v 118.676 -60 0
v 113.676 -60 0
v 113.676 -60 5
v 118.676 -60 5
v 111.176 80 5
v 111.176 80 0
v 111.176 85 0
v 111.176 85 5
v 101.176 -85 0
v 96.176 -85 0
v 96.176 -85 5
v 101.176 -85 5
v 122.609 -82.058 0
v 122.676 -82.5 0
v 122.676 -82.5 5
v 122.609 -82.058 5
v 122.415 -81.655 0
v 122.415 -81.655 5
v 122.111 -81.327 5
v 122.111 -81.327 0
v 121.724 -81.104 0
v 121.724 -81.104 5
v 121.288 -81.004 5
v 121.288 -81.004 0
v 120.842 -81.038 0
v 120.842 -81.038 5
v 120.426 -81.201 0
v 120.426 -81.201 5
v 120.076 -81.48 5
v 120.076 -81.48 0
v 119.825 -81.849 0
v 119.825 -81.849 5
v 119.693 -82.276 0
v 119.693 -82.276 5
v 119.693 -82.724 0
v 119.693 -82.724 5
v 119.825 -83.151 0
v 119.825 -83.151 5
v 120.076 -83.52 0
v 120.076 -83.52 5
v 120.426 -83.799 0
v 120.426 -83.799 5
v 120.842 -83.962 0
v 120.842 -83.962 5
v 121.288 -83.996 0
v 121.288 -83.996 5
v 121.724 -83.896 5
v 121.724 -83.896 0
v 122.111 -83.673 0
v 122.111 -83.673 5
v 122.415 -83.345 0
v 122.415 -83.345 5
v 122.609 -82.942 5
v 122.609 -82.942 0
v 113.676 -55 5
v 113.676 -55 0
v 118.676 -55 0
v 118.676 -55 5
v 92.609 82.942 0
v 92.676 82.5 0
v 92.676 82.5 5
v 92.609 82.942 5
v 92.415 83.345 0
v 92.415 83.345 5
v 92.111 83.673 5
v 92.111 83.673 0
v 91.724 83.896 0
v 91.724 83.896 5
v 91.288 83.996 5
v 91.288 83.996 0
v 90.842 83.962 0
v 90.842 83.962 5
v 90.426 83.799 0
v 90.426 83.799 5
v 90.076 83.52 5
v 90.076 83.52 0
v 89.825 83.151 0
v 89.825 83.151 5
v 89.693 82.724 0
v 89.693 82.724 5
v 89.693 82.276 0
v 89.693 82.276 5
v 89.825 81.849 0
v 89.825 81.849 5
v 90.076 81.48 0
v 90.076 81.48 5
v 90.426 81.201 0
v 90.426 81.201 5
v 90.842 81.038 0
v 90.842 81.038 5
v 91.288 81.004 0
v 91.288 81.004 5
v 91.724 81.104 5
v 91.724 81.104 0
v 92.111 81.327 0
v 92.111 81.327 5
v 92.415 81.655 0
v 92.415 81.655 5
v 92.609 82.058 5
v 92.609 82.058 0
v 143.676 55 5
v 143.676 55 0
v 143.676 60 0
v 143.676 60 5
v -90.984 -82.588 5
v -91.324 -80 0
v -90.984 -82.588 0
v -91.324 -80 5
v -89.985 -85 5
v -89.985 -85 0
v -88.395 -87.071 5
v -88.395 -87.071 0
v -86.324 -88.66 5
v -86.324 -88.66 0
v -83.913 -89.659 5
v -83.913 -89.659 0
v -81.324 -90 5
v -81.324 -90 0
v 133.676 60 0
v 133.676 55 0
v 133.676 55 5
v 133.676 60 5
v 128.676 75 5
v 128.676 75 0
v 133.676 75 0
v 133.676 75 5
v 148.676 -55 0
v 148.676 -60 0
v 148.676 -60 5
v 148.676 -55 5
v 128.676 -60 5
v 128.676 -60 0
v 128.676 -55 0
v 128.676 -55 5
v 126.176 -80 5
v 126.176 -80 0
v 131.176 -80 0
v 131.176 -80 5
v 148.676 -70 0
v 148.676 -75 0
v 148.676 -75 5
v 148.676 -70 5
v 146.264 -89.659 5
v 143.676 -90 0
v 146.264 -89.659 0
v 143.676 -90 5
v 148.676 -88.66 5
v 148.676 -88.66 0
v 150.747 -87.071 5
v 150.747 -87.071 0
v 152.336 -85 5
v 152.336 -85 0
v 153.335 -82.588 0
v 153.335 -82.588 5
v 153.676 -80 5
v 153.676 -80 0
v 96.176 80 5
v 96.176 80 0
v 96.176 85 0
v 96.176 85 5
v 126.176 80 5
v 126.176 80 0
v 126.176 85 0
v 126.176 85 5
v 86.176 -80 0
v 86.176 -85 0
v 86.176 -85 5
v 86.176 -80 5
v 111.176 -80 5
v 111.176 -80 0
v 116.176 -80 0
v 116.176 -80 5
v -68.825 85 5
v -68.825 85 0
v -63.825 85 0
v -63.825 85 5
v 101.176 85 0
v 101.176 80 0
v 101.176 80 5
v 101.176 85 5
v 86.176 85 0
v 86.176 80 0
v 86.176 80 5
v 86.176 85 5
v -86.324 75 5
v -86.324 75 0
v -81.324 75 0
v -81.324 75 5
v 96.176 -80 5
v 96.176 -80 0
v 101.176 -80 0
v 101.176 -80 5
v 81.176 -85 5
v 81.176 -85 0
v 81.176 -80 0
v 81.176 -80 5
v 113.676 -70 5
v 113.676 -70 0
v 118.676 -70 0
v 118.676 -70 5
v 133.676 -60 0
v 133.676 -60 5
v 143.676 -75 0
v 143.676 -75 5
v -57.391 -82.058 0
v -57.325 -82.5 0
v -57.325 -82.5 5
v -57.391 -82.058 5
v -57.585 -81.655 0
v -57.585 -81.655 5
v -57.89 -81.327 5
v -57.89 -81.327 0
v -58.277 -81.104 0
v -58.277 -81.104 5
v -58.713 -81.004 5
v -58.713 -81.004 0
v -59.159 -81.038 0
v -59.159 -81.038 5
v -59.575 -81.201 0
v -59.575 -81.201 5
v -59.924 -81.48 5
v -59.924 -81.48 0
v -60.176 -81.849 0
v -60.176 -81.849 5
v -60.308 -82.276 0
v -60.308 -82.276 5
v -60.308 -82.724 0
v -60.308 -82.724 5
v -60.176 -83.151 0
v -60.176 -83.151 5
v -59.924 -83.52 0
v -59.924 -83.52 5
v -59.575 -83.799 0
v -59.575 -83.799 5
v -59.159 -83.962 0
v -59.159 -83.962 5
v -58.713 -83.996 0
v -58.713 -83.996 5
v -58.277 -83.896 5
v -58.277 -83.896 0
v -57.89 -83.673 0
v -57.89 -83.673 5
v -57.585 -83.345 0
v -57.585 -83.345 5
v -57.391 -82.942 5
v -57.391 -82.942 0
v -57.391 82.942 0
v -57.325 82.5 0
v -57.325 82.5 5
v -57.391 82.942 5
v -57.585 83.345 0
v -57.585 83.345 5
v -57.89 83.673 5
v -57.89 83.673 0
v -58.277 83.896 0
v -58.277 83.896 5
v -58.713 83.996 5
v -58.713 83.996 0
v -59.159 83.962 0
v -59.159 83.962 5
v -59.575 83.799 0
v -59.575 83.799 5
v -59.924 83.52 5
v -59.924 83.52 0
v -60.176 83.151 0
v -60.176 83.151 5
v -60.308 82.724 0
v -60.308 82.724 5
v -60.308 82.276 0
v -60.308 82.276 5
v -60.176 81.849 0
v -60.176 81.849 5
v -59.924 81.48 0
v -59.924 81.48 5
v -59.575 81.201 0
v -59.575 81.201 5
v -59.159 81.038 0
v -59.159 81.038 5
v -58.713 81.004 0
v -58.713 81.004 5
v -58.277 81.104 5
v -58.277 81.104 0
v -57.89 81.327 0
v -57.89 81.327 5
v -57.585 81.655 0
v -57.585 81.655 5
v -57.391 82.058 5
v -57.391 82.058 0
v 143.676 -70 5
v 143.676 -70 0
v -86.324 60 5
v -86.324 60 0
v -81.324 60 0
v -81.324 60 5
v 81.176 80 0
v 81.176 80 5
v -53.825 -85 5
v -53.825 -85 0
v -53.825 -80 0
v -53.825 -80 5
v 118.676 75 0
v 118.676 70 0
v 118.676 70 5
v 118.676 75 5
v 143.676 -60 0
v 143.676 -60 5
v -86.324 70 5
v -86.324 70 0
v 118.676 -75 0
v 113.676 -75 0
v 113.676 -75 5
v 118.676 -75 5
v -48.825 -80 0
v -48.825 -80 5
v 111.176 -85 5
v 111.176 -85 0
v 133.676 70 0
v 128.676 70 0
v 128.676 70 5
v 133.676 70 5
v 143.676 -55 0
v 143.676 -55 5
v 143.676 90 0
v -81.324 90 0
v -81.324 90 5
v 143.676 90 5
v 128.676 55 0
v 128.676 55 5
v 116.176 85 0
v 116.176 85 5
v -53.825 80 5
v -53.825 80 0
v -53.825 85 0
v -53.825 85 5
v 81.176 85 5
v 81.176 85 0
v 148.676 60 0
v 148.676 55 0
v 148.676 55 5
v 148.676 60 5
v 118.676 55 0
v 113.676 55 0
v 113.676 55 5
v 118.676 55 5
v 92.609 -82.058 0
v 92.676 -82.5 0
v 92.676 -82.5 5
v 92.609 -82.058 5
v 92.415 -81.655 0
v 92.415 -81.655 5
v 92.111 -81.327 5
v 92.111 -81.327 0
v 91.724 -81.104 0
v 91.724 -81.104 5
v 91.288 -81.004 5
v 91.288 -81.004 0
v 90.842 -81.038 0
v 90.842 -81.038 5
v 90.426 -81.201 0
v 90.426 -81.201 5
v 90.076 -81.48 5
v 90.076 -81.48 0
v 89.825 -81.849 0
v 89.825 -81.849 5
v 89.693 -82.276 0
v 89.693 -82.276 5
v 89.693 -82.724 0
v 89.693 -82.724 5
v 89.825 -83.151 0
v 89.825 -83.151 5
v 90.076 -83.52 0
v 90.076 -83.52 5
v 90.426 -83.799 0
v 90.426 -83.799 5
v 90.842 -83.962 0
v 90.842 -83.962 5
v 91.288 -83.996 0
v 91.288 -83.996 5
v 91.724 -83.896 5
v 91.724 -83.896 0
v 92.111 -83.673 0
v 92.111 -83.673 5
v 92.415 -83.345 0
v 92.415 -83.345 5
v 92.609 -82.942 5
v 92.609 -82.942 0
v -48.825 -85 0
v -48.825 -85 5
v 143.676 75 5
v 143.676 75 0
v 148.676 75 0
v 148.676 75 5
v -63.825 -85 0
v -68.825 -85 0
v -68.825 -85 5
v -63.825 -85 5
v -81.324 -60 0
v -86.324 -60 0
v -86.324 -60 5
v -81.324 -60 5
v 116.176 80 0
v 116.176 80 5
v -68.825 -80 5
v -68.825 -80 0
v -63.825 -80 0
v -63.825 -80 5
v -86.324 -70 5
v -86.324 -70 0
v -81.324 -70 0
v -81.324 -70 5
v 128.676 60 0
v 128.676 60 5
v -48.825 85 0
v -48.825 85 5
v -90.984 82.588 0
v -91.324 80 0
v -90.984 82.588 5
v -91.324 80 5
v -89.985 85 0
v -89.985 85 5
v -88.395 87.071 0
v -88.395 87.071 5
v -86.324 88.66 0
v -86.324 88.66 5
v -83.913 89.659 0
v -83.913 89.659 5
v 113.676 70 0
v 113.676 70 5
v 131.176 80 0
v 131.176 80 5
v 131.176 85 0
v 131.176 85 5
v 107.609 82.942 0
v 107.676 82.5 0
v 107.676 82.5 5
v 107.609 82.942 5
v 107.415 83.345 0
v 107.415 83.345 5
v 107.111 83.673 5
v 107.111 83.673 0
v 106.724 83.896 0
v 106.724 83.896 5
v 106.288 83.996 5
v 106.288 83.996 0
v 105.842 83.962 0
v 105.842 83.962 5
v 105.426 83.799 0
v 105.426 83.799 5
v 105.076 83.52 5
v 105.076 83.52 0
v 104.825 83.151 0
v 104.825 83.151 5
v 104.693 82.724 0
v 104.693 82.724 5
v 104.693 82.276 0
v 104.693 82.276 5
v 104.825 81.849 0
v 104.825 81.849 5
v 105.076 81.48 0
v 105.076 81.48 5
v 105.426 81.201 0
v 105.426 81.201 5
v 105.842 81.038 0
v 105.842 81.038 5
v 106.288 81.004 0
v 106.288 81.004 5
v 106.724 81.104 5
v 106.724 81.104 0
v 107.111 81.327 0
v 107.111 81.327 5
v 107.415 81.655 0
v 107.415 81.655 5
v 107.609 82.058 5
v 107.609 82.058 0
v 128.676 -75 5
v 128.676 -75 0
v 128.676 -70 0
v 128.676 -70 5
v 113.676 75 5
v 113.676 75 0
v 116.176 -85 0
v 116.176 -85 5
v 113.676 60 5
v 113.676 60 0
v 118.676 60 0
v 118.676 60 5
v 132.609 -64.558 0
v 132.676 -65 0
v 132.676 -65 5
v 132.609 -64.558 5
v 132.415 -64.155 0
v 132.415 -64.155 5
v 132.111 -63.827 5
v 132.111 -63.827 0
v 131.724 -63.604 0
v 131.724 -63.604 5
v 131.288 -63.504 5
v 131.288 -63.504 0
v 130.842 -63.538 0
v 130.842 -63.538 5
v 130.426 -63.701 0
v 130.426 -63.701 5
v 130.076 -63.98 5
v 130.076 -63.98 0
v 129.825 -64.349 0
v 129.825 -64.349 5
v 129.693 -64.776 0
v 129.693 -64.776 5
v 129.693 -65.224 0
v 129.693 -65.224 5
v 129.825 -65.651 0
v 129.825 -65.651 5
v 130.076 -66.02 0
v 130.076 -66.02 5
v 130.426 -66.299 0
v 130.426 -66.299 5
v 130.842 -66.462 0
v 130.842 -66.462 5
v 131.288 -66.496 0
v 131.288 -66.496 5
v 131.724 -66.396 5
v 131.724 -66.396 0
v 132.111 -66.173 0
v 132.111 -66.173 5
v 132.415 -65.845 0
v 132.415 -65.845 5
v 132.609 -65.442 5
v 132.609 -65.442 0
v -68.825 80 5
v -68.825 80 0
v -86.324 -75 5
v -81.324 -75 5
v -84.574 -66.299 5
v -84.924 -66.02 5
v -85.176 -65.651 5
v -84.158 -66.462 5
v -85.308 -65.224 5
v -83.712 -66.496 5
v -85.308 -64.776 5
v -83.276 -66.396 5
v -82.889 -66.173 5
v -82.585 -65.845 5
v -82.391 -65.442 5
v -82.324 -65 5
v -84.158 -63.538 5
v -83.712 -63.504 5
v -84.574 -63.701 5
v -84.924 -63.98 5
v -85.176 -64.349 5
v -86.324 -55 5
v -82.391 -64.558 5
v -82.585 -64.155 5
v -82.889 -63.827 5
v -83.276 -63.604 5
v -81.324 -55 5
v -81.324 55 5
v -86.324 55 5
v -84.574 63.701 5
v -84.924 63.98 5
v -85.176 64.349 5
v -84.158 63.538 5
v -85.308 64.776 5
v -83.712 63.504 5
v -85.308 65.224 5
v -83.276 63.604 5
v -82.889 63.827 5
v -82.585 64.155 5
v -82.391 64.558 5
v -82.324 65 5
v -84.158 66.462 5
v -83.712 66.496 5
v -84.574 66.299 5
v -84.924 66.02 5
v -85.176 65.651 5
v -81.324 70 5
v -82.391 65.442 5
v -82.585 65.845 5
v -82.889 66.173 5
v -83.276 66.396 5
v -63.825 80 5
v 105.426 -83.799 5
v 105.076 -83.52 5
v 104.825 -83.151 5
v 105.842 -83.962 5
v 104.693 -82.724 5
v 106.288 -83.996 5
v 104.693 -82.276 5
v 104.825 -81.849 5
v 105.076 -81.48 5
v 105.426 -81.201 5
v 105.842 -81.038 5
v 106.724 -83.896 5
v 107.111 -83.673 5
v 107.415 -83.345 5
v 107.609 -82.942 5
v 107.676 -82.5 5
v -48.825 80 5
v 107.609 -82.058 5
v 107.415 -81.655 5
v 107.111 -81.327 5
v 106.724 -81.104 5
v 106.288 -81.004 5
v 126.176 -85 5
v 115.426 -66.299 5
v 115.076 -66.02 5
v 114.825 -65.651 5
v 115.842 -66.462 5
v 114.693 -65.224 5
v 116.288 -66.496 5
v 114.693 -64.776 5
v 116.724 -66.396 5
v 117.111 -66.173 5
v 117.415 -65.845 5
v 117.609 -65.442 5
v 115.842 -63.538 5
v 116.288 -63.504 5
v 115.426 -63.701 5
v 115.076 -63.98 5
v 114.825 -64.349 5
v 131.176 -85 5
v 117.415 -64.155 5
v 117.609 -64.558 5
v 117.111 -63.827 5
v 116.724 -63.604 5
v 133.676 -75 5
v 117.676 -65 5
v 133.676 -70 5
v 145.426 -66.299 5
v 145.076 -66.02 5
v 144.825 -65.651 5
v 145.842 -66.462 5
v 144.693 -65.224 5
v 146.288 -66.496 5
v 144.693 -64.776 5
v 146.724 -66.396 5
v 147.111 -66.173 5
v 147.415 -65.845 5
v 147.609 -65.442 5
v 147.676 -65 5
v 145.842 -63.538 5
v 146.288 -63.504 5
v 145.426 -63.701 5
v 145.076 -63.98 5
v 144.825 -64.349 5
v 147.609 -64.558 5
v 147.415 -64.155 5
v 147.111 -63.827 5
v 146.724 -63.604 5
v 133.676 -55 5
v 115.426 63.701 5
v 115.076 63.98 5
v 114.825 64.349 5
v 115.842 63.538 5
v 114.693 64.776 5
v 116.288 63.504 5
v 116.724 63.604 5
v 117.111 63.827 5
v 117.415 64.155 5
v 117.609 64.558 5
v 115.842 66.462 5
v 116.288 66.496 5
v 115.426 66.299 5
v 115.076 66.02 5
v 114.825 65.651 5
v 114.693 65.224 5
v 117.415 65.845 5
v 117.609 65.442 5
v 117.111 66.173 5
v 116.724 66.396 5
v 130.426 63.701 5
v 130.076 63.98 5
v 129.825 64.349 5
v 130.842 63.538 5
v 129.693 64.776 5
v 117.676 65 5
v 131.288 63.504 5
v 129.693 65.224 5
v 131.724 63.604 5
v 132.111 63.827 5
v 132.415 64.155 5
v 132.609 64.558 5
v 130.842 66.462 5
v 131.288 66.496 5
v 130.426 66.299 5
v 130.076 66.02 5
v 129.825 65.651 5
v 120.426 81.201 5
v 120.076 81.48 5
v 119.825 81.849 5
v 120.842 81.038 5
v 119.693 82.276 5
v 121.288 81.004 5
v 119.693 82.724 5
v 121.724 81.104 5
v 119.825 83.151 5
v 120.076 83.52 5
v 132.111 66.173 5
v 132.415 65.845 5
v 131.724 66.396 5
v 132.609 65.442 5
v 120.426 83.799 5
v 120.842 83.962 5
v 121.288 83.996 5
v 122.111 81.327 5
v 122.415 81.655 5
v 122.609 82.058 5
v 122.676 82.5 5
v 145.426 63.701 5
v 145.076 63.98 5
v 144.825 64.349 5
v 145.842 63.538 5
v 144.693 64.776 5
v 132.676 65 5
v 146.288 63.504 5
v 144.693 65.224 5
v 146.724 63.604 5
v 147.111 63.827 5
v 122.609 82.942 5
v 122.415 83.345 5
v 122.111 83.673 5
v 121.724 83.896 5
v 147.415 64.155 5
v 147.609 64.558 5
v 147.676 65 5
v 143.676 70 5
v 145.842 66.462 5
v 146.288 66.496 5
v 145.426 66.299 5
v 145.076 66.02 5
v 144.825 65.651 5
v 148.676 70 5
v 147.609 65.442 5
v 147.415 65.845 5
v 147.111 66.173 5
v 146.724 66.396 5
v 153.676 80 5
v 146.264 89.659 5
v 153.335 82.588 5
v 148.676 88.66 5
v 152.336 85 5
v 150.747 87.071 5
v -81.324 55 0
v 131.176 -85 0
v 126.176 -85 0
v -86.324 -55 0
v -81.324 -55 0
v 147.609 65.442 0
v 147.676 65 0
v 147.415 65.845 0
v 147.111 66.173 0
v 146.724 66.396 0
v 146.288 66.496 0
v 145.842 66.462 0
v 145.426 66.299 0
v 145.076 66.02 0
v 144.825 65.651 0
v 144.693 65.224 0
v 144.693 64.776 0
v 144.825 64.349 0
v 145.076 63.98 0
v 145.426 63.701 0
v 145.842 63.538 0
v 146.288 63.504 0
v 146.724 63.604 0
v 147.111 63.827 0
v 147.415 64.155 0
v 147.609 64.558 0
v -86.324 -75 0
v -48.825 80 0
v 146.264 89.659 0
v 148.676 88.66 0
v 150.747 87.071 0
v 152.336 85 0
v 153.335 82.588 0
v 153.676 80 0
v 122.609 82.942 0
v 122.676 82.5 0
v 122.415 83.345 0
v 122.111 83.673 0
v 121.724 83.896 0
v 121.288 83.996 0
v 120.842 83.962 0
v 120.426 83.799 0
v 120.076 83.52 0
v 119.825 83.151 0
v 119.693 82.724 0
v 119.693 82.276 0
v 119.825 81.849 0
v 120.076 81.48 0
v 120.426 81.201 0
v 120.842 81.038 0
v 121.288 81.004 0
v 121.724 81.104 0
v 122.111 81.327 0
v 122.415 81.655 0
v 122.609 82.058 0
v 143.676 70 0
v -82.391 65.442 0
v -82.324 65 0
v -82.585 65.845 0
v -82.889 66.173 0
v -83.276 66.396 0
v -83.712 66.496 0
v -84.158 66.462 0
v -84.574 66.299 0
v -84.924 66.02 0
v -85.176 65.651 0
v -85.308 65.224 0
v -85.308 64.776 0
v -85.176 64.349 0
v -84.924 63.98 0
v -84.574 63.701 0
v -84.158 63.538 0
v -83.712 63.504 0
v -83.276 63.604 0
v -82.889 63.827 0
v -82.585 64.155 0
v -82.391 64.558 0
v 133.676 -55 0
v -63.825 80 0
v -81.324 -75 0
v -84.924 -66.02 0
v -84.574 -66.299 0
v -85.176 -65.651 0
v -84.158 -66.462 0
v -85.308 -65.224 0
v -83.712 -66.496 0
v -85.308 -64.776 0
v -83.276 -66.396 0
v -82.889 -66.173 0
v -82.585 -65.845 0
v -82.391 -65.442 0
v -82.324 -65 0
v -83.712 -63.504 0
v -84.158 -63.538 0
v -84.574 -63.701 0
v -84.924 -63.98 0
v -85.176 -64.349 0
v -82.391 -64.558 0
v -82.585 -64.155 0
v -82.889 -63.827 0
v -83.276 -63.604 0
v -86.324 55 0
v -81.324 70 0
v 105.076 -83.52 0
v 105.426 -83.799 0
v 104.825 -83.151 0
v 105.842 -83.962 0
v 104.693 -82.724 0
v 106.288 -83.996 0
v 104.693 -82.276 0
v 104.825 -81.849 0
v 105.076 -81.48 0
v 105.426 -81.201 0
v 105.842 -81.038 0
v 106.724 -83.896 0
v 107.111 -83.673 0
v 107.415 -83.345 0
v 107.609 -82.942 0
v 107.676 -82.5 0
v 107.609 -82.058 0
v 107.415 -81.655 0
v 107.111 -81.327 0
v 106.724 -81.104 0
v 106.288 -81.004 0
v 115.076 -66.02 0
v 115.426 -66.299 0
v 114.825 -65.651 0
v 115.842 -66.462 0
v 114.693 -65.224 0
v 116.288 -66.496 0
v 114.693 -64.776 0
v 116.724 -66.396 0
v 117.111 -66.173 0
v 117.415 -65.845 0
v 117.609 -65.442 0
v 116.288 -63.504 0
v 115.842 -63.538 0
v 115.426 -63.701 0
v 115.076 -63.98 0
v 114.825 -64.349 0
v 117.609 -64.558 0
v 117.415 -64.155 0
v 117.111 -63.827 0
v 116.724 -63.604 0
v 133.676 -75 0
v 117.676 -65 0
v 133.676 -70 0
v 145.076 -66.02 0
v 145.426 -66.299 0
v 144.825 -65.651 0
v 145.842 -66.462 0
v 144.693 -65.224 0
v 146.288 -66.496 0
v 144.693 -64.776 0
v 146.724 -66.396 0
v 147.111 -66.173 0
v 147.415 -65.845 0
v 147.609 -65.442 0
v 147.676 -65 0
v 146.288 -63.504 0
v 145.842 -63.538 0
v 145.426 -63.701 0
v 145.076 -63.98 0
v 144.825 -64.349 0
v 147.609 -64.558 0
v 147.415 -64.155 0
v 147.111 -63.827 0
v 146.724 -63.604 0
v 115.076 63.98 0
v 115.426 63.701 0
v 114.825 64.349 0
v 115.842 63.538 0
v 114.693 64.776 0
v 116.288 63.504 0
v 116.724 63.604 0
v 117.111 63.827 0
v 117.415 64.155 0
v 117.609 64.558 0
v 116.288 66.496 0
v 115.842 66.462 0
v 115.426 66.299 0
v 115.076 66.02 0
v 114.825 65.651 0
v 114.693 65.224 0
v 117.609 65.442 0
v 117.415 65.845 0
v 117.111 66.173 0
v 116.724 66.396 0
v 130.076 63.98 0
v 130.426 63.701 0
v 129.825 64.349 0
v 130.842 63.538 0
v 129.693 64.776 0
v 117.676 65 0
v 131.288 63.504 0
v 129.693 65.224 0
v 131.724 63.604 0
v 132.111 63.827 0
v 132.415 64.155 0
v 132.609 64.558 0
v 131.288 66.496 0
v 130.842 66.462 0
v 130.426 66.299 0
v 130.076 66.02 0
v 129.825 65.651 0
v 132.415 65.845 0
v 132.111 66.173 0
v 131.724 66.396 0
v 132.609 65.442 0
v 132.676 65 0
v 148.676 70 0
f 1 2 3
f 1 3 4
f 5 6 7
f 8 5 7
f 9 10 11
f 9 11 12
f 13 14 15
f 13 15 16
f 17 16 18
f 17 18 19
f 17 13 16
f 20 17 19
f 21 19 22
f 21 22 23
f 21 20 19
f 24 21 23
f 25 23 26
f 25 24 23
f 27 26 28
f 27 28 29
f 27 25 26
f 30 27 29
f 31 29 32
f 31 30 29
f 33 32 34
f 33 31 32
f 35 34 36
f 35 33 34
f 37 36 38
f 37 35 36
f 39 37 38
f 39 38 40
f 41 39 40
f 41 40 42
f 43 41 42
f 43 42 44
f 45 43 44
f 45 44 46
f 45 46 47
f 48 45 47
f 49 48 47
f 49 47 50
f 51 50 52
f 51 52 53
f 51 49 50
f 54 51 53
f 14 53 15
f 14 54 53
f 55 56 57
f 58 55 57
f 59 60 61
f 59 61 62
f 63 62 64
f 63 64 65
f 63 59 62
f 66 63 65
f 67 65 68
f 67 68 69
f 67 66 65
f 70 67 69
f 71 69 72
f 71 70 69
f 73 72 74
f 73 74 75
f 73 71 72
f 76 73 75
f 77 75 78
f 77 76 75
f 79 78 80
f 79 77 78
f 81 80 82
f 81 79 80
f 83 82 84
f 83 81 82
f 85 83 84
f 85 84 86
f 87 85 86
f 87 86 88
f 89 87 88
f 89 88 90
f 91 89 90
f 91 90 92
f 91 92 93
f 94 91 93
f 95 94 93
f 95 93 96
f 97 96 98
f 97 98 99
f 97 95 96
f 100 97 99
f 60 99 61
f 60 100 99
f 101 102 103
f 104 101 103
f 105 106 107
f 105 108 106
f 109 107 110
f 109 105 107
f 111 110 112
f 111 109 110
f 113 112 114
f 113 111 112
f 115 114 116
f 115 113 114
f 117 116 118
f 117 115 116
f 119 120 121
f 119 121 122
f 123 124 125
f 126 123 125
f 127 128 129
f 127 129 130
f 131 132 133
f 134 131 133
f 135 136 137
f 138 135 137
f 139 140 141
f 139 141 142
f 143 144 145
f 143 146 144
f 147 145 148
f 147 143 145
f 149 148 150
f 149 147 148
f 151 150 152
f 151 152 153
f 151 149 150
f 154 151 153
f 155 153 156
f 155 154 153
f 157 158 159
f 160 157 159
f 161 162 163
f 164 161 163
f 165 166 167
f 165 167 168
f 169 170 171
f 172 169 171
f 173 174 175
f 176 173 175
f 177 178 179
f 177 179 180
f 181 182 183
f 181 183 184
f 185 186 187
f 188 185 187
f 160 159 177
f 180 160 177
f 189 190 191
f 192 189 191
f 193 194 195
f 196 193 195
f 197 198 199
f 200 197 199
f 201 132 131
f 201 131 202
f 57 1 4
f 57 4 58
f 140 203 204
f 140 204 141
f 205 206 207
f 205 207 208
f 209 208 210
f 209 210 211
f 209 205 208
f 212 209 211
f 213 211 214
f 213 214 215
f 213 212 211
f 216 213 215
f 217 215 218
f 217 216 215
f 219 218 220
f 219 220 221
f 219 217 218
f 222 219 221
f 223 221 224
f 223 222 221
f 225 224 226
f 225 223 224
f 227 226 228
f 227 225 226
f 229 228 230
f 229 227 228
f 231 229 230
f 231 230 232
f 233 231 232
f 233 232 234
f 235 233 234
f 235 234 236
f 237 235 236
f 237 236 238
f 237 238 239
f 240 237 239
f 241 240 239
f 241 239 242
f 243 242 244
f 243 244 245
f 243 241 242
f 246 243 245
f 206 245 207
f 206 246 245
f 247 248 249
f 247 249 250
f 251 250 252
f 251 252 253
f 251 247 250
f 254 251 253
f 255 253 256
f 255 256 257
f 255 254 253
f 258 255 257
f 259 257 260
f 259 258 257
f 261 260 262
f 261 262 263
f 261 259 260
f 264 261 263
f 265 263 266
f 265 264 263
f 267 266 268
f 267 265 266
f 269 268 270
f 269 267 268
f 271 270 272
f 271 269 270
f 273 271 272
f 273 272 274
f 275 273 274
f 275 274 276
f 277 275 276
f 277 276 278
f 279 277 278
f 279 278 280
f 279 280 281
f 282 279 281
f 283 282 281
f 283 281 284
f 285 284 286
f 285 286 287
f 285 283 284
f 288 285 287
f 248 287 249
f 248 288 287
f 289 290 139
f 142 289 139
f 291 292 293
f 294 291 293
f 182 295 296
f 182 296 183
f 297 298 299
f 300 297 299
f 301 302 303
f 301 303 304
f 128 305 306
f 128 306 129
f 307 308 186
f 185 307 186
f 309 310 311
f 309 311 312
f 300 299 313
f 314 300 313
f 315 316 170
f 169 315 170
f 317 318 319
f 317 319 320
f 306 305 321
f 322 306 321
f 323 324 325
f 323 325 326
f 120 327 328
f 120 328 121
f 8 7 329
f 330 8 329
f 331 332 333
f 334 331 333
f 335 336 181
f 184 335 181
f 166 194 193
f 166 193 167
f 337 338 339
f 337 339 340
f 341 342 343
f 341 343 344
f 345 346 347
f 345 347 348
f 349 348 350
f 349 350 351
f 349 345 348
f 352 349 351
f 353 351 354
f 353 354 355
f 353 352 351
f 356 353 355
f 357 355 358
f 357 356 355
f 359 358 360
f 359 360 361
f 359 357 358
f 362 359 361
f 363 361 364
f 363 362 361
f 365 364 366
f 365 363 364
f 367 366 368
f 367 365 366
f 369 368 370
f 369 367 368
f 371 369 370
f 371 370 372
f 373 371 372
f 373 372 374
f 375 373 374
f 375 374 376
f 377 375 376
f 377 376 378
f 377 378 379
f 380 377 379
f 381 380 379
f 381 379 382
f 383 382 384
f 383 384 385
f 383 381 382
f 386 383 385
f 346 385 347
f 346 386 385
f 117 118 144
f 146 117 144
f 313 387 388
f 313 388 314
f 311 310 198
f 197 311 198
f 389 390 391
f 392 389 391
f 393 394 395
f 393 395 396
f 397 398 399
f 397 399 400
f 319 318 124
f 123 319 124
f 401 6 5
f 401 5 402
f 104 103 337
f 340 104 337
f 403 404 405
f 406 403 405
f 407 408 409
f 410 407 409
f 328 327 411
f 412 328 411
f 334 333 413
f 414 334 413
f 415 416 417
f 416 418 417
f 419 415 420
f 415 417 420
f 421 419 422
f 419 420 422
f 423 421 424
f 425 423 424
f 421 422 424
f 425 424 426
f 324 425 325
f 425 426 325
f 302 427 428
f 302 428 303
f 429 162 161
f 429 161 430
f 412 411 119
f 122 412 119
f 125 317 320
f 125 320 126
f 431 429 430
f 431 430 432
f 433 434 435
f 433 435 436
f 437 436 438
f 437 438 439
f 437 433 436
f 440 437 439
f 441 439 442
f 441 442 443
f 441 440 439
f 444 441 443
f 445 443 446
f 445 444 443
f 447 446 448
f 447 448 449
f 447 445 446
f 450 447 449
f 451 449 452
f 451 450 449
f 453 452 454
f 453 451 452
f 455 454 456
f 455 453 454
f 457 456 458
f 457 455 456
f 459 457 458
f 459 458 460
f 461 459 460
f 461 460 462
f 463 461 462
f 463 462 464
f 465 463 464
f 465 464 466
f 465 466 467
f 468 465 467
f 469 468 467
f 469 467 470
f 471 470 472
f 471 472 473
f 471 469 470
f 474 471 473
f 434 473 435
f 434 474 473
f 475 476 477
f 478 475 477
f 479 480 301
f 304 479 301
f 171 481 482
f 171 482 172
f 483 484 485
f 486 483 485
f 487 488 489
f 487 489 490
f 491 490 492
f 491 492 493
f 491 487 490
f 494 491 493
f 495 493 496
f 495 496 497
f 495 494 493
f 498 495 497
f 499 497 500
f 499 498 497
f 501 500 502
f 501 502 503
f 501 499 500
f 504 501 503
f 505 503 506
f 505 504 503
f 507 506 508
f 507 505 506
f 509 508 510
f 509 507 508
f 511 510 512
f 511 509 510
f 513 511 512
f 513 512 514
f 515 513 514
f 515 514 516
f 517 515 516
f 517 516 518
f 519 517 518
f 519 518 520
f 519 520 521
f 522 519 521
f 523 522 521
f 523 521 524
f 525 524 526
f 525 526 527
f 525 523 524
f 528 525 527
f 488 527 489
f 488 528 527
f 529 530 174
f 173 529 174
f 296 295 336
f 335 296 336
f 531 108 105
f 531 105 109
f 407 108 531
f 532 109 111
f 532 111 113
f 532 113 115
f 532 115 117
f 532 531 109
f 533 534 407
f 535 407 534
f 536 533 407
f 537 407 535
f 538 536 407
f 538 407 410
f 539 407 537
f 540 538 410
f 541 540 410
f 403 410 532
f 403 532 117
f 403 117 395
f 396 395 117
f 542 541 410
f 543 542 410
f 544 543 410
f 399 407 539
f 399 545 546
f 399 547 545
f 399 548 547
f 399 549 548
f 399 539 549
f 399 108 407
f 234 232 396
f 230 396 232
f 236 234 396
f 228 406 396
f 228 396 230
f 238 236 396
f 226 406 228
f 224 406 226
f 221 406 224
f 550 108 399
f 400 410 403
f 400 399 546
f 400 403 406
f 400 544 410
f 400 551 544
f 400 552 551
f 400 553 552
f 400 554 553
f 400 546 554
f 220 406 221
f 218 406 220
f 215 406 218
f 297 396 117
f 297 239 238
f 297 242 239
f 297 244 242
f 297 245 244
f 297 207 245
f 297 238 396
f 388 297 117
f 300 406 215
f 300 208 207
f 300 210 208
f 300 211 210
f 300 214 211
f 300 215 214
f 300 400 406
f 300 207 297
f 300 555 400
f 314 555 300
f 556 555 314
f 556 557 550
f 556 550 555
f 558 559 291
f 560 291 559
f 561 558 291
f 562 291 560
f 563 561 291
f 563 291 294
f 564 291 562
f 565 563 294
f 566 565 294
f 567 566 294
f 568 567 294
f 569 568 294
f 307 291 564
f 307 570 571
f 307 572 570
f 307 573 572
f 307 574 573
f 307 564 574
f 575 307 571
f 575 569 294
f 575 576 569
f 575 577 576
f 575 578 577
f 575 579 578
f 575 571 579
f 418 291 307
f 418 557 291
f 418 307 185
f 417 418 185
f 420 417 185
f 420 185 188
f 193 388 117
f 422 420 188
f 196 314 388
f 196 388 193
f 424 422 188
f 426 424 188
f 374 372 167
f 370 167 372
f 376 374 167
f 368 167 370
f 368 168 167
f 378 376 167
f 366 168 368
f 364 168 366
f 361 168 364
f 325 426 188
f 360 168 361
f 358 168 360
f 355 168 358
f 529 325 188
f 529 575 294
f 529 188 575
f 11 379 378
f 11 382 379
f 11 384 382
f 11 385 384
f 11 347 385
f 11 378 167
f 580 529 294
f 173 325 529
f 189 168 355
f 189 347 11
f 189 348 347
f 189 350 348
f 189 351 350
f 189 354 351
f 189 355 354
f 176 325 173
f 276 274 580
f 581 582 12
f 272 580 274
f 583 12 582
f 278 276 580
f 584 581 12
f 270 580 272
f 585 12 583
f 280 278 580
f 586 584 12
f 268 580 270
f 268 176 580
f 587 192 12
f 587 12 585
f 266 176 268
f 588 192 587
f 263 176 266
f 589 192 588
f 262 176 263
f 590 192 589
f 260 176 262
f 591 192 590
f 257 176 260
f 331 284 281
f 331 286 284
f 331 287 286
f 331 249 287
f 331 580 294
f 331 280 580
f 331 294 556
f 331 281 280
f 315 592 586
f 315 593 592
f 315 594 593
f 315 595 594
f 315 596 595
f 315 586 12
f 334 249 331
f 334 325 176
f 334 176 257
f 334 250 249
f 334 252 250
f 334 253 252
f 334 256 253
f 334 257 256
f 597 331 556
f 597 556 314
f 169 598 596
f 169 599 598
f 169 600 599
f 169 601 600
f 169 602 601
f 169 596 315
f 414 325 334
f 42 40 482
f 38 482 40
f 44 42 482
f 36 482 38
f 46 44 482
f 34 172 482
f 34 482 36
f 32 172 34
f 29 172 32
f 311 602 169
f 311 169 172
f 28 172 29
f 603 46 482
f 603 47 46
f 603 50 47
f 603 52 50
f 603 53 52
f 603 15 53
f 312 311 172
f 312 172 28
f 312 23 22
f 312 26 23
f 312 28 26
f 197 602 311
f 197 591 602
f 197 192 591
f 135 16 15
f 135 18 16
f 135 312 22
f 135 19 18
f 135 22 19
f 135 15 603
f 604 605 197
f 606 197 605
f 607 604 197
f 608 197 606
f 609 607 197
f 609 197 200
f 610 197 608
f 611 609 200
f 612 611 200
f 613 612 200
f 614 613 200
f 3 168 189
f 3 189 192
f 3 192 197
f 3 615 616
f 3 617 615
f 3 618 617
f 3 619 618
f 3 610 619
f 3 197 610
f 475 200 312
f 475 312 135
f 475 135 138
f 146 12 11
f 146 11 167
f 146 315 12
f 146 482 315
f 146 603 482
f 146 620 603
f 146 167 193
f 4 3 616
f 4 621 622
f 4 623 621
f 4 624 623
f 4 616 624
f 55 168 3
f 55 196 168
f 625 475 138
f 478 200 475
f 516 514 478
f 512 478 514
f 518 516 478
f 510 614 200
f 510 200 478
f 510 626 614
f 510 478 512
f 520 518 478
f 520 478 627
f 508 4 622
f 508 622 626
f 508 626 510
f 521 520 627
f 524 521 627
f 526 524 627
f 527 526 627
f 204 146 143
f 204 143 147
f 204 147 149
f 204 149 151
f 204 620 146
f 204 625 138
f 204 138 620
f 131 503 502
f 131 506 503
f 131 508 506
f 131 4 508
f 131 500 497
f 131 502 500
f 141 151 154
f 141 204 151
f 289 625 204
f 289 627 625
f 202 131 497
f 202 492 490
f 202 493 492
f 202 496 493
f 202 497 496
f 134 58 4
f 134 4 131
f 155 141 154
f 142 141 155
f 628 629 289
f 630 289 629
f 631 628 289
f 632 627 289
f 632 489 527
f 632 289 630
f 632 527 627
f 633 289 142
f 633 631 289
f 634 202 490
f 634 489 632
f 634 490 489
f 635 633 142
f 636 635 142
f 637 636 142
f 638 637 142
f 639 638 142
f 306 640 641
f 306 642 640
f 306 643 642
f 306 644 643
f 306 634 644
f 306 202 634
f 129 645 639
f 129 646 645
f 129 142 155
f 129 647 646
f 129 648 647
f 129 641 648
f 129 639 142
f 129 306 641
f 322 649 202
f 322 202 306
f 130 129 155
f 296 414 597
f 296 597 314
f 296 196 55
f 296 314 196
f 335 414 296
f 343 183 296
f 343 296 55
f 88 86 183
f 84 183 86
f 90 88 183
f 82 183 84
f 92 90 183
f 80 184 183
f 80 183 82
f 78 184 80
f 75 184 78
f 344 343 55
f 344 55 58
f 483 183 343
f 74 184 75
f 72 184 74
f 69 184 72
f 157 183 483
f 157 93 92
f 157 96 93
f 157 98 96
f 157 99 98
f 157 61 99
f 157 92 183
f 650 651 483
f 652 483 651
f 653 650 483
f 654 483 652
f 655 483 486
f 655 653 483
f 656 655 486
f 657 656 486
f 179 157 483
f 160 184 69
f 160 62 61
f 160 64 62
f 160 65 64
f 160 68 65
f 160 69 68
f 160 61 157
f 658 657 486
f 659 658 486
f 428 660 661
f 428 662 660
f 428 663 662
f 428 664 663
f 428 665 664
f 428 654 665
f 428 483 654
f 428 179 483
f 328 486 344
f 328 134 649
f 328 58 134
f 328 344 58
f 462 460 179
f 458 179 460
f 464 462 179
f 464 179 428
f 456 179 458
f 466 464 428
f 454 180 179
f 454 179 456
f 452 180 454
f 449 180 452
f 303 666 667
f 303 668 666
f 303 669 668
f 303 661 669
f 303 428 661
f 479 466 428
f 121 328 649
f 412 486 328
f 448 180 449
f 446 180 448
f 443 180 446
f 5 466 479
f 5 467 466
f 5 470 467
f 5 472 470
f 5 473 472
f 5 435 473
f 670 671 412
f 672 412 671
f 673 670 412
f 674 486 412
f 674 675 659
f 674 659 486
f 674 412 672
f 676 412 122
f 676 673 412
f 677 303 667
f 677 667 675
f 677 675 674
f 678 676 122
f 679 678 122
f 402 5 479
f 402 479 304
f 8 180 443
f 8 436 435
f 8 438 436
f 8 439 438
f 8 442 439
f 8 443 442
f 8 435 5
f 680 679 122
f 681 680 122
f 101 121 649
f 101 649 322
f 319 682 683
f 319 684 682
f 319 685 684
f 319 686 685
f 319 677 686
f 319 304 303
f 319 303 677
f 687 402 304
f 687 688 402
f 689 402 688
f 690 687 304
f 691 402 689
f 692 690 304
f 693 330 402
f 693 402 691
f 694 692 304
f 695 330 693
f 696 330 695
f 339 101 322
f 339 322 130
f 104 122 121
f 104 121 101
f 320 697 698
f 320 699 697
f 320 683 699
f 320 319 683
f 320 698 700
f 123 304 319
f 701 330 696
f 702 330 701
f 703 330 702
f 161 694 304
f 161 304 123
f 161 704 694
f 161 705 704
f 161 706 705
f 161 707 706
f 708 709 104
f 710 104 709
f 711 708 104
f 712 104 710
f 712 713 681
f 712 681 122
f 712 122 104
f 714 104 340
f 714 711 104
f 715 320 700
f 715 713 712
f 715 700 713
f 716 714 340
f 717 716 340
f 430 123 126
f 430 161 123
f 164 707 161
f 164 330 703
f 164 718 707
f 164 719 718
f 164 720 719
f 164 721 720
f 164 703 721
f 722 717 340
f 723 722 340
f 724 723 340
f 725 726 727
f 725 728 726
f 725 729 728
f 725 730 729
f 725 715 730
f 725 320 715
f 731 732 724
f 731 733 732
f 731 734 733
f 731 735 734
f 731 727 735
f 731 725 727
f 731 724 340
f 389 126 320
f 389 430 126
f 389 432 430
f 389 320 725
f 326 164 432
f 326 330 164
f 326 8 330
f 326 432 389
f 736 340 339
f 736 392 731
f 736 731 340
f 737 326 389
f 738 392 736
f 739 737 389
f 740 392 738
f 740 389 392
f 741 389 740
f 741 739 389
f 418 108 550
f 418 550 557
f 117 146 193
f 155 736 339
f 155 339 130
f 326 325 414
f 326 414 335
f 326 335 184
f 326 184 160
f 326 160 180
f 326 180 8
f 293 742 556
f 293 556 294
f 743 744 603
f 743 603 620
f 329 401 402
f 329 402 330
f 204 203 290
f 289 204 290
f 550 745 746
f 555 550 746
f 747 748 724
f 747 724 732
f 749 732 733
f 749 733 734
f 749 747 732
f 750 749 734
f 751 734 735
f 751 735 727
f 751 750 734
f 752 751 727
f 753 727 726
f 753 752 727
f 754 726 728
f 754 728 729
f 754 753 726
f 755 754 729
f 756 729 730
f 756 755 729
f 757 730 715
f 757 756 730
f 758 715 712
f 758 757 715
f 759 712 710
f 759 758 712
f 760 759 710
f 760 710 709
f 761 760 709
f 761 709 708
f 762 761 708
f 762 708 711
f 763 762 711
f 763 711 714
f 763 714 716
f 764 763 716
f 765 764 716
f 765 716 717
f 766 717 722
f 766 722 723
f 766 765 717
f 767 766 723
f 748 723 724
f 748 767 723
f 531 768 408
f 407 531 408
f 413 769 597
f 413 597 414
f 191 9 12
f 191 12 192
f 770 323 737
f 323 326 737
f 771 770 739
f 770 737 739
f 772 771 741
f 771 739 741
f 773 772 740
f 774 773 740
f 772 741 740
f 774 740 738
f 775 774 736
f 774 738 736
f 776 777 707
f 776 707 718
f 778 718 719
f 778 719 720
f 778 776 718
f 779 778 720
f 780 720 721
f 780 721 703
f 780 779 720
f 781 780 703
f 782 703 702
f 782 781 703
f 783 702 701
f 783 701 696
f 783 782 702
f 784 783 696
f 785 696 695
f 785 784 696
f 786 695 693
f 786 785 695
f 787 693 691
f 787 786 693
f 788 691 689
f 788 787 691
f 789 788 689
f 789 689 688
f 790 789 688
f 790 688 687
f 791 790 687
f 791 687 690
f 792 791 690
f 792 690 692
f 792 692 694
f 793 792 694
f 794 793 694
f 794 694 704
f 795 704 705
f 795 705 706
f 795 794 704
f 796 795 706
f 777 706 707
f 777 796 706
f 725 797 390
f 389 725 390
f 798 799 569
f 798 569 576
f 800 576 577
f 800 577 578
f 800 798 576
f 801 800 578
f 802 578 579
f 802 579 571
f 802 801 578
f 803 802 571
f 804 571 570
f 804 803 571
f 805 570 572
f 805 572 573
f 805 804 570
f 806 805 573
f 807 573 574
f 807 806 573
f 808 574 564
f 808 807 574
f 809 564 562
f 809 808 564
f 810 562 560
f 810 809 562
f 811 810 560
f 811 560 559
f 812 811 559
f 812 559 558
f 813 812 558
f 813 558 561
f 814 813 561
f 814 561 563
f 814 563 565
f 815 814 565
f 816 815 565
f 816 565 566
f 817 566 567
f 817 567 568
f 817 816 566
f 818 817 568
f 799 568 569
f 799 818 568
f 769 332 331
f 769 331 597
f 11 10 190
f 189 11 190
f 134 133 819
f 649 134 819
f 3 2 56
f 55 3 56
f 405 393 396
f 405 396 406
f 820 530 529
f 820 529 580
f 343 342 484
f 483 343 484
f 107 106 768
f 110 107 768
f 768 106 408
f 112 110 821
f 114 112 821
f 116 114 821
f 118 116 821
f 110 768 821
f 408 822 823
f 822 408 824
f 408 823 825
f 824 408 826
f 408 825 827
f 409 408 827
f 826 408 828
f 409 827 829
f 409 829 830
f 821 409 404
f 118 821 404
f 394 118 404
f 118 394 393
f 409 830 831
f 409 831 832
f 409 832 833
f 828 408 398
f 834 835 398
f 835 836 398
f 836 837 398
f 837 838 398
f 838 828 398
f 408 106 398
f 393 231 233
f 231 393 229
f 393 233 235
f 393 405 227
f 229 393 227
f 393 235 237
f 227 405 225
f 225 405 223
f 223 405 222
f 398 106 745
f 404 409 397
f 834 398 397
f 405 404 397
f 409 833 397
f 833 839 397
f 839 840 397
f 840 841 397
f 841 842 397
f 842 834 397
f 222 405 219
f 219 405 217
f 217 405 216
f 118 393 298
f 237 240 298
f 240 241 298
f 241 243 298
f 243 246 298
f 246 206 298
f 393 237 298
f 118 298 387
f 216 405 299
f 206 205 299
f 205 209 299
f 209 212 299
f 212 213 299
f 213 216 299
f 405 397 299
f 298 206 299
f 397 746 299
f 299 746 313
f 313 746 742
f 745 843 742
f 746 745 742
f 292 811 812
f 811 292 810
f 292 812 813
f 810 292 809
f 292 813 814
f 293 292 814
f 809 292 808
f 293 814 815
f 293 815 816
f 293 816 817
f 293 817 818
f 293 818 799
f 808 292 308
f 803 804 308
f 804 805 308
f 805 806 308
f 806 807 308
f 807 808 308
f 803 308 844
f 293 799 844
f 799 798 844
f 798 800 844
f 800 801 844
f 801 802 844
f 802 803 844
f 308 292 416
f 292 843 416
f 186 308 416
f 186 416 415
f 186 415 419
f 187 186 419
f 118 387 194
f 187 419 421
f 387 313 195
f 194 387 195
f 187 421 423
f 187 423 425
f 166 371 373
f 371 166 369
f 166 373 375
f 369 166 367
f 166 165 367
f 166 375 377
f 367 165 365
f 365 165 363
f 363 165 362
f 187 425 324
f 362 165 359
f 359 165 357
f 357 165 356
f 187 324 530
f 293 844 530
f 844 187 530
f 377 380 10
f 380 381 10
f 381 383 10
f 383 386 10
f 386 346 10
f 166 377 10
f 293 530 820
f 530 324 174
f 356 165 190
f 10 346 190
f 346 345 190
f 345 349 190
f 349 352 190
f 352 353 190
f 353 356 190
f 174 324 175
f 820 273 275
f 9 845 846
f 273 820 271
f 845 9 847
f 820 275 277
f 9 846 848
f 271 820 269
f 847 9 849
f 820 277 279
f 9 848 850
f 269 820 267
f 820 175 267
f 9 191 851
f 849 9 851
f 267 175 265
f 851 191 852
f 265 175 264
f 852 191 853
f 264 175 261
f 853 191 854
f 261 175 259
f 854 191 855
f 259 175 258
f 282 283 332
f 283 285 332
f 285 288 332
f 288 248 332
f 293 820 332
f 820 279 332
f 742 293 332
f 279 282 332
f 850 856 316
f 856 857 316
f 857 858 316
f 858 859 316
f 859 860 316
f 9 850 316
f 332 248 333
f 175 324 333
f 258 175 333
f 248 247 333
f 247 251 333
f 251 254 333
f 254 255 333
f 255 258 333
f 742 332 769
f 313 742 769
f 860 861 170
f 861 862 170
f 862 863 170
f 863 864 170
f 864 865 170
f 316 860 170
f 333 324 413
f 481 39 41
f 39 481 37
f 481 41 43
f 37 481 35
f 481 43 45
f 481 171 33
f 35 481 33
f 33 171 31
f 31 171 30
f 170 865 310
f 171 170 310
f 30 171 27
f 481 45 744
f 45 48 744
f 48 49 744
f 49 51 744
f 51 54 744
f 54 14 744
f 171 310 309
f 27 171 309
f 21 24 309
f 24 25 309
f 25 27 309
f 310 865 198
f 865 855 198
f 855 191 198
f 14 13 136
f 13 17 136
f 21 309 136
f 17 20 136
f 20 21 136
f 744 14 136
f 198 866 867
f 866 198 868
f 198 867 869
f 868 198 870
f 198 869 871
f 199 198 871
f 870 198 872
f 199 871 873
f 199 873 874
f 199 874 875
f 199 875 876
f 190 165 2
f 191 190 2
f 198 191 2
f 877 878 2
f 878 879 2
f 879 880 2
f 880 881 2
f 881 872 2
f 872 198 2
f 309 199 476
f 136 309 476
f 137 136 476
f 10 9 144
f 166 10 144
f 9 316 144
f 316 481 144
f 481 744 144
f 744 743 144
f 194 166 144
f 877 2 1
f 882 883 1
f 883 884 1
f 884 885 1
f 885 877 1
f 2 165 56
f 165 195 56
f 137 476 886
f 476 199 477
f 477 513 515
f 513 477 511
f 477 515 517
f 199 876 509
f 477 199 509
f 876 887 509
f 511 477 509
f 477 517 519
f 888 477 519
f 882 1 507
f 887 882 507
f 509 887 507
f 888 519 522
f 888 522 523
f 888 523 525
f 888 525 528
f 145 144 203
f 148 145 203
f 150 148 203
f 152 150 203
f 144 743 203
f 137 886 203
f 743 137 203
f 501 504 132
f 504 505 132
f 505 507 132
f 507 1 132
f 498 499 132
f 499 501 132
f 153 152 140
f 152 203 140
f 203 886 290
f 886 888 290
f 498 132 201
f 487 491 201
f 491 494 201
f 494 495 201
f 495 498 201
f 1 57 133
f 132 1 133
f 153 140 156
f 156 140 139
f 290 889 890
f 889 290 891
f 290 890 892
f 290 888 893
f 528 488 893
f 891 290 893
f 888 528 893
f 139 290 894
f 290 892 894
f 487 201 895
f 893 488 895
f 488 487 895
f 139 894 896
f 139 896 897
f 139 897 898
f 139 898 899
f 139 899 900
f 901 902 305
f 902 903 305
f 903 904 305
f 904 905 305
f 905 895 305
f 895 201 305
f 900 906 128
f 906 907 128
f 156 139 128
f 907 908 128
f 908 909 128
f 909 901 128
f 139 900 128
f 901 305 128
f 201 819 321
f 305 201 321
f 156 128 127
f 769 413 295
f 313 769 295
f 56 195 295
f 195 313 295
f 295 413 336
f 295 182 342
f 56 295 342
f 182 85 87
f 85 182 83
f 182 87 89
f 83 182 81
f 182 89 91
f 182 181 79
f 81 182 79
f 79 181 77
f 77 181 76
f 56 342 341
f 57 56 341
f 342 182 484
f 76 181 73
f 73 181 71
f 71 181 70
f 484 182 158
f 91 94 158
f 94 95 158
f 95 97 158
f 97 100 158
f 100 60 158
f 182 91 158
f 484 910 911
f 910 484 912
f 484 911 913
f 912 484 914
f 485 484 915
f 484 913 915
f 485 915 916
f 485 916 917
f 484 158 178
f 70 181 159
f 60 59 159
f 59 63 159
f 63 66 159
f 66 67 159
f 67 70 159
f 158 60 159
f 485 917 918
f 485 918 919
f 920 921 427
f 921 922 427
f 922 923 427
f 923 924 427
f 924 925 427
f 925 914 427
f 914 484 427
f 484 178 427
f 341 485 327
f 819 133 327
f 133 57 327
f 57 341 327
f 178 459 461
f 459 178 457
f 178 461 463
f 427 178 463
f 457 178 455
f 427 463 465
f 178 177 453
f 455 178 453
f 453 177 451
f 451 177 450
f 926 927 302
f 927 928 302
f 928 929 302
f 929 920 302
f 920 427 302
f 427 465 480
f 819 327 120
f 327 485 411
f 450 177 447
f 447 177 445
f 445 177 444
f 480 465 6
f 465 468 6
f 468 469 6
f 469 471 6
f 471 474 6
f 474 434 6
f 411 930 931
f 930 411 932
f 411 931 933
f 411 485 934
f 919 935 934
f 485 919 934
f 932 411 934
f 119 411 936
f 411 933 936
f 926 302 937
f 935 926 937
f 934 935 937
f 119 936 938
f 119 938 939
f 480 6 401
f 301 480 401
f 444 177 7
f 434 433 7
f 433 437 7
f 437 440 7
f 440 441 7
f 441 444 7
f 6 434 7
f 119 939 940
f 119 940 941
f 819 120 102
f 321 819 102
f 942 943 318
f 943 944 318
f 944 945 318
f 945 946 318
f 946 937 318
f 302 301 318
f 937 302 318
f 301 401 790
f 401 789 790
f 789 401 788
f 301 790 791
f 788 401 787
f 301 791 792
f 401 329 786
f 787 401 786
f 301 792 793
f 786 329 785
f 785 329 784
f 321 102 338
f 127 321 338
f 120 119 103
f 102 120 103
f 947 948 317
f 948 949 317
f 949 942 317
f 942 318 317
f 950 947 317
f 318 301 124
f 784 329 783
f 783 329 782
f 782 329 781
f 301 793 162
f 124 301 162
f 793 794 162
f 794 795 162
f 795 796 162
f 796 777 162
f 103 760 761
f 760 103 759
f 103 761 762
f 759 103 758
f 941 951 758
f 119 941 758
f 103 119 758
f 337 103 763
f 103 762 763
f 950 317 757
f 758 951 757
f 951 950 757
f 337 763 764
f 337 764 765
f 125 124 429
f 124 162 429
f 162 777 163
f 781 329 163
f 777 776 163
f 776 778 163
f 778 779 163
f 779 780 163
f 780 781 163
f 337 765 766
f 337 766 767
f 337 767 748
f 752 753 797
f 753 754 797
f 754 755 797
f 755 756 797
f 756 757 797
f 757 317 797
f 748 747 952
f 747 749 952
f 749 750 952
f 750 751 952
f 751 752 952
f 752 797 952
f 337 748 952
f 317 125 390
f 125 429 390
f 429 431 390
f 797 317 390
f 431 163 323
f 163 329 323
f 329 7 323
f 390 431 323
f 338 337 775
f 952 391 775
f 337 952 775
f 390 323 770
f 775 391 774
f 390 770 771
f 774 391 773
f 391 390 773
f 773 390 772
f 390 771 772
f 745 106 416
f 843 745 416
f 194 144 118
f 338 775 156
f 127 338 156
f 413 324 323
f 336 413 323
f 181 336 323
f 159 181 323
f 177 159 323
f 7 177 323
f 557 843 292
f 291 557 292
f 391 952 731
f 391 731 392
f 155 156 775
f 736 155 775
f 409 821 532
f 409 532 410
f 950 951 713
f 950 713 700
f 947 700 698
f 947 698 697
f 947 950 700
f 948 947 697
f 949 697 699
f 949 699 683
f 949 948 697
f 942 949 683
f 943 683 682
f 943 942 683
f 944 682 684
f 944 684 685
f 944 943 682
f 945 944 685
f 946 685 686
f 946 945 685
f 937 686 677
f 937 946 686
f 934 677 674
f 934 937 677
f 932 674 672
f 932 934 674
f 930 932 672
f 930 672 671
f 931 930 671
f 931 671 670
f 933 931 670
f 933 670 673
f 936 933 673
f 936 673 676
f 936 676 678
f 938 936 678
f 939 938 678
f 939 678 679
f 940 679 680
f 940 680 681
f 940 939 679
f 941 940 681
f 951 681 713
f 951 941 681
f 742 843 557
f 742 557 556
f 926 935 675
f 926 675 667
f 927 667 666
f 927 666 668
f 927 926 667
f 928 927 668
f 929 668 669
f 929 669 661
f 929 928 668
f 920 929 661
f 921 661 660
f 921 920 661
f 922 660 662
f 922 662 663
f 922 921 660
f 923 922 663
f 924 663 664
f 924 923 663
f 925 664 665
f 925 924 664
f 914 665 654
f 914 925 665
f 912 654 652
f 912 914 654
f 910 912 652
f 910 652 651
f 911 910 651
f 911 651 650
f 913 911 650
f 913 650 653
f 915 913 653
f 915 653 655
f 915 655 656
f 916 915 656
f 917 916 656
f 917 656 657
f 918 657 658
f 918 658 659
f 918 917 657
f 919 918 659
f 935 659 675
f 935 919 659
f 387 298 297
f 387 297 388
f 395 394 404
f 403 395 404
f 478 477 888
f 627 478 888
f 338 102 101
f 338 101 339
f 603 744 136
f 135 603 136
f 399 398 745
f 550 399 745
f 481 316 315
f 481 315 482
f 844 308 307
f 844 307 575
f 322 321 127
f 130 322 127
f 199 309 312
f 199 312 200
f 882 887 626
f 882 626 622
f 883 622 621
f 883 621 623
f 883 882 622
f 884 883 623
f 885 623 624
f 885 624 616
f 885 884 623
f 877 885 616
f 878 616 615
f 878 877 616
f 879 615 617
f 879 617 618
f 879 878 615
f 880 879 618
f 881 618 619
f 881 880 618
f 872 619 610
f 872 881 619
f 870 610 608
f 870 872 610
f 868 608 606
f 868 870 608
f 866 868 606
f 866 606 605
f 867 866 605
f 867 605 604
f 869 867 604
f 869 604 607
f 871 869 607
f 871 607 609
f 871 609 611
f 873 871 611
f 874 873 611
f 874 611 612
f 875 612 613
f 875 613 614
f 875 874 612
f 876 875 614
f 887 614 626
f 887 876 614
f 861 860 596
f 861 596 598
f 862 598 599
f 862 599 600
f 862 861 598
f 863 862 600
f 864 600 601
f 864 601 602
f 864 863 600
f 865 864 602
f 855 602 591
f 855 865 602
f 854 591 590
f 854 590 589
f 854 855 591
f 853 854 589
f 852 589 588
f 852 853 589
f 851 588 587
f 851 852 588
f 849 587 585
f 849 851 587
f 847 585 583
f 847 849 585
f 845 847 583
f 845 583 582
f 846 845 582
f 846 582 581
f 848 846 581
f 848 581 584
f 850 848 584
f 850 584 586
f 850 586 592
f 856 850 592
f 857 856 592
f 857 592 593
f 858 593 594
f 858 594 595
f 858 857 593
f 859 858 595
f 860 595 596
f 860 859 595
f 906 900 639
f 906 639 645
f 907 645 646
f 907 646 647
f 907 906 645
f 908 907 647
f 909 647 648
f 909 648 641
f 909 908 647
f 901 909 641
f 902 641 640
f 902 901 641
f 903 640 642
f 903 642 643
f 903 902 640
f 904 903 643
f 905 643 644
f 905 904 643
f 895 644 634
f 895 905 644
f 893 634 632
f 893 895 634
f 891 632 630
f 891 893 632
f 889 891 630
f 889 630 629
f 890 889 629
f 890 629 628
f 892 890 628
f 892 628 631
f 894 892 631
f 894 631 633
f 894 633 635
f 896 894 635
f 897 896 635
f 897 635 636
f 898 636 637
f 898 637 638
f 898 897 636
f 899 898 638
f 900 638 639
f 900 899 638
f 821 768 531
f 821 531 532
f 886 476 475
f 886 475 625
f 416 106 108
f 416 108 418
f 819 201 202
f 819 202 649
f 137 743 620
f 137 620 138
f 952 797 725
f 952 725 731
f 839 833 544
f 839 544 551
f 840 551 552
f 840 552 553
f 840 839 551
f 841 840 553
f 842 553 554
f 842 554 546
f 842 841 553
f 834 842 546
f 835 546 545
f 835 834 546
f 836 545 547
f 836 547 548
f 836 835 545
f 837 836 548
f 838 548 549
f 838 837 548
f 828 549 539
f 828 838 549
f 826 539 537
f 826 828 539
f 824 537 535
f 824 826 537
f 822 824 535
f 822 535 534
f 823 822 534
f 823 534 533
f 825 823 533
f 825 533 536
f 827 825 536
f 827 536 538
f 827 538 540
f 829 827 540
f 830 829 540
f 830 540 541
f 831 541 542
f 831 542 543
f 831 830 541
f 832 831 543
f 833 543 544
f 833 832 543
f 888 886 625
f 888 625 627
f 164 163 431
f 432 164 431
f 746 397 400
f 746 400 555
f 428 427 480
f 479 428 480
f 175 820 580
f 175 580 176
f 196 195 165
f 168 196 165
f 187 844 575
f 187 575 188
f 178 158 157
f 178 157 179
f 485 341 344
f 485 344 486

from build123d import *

# Parameters (mm, degrees)
BOSS_EXTRUDE1_OUTLINE_W   = 245.000446045
BOSS_EXTRUDE1_OUTLINE_H   = 180
BOSS_EXTRUDE1_OUTLINE_W_2 = 5
BOSS_EXTRUDE1_OUTLINE_H_2 = 5
BOSS_EXTRUDE1_OUTLINE_R   = 1.5
BOSS_EXTRUDE1_DEPTH       = 5
FILLET1_R                 = 10


# Read off the part's stored shape, not the designer's step: Boss-Extrude1
with BuildPart() as part:
    # Boss-Extrude1 outline → Boss-Extrude1 (new body)
    with BuildSketch(Plane.XY):
        with Locations((31.175821468, 0)):
            Rectangle(BOSS_EXTRUDE1_OUTLINE_W, BOSS_EXTRUDE1_OUTLINE_H)
        with Locations((-66.324847601, -82.5)):
            Rectangle(BOSS_EXTRUDE1_OUTLINE_W_2, BOSS_EXTRUDE1_OUTLINE_H_2, mode=Mode.SUBTRACT)
        with Locations((-83.824401555, -72.5)):
            Rectangle(BOSS_EXTRUDE1_OUTLINE_W_2, BOSS_EXTRUDE1_OUTLINE_H_2, mode=Mode.SUBTRACT)
        with Locations((-58.824847601, -82.5)):
            Circle(BOSS_EXTRUDE1_OUTLINE_R, mode=Mode.SUBTRACT)
        with Locations((-51.324847601, -82.5)):
            Rectangle(BOSS_EXTRUDE1_OUTLINE_W_2, BOSS_EXTRUDE1_OUTLINE_H_2, mode=Mode.SUBTRACT)
        with Locations((-83.824401555, -65)):
            Circle(BOSS_EXTRUDE1_OUTLINE_R, mode=Mode.SUBTRACT)
        with Locations((-83.824401555, -57.5)):
            Rectangle(BOSS_EXTRUDE1_OUTLINE_W_2, BOSS_EXTRUDE1_OUTLINE_H_2, mode=Mode.SUBTRACT)
        with Locations((83.67604449, -82.5)):
            Rectangle(BOSS_EXTRUDE1_OUTLINE_W_2, BOSS_EXTRUDE1_OUTLINE_H_2, mode=Mode.SUBTRACT)
        with Locations((91.17604449, -82.5)):
            Circle(BOSS_EXTRUDE1_OUTLINE_R, mode=Mode.SUBTRACT)
        with Locations((98.67604449, -82.5)):
            Rectangle(BOSS_EXTRUDE1_OUTLINE_W_2, BOSS_EXTRUDE1_OUTLINE_H_2, mode=Mode.SUBTRACT)
        with Locations((106.17604449, -82.5)):
            Circle(BOSS_EXTRUDE1_OUTLINE_R, mode=Mode.SUBTRACT)
        with Locations((113.67604449, -82.5)):
            Rectangle(BOSS_EXTRUDE1_OUTLINE_W_2, BOSS_EXTRUDE1_OUTLINE_H_2, mode=Mode.SUBTRACT)
        with Locations((121.17604449, -82.5)):
            Circle(BOSS_EXTRUDE1_OUTLINE_R, mode=Mode.SUBTRACT)
        with Locations((116.17604449, -72.5)):
            Rectangle(BOSS_EXTRUDE1_OUTLINE_W_2, BOSS_EXTRUDE1_OUTLINE_H_2, mode=Mode.SUBTRACT)
        with Locations((128.67604449, -82.5)):
            Rectangle(BOSS_EXTRUDE1_OUTLINE_W_2, BOSS_EXTRUDE1_OUTLINE_H_2, mode=Mode.SUBTRACT)
        with Locations((131.17604449, -72.5)):
            Rectangle(BOSS_EXTRUDE1_OUTLINE_W_2, BOSS_EXTRUDE1_OUTLINE_H_2, mode=Mode.SUBTRACT)
        with Locations((146.17604449, -72.5)):
            Rectangle(BOSS_EXTRUDE1_OUTLINE_W_2, BOSS_EXTRUDE1_OUTLINE_H_2, mode=Mode.SUBTRACT)
        with Locations((116.17604449, -65)):
            Circle(BOSS_EXTRUDE1_OUTLINE_R, mode=Mode.SUBTRACT)
        with Locations((116.17604449, -57.5)):
            Rectangle(BOSS_EXTRUDE1_OUTLINE_W_2, BOSS_EXTRUDE1_OUTLINE_H_2, mode=Mode.SUBTRACT)
        with Locations((131.17604449, -65)):
            Circle(BOSS_EXTRUDE1_OUTLINE_R, mode=Mode.SUBTRACT)
        with Locations((131.17604449, -57.5)):
            Rectangle(BOSS_EXTRUDE1_OUTLINE_W_2, BOSS_EXTRUDE1_OUTLINE_H_2, mode=Mode.SUBTRACT)
        with Locations((146.17604449, -65)):
            Circle(BOSS_EXTRUDE1_OUTLINE_R, mode=Mode.SUBTRACT)
        with Locations((146.17604449, -57.5)):
            Rectangle(BOSS_EXTRUDE1_OUTLINE_W_2, BOSS_EXTRUDE1_OUTLINE_H_2, mode=Mode.SUBTRACT)
        with Locations((-83.824401555, 57.5)):
            Rectangle(BOSS_EXTRUDE1_OUTLINE_W_2, BOSS_EXTRUDE1_OUTLINE_H_2, mode=Mode.SUBTRACT)
        with Locations((-83.824401555, 65)):
            Circle(BOSS_EXTRUDE1_OUTLINE_R, mode=Mode.SUBTRACT)
        with Locations((-83.824401555, 72.5)):
            Rectangle(BOSS_EXTRUDE1_OUTLINE_W_2, BOSS_EXTRUDE1_OUTLINE_H_2, mode=Mode.SUBTRACT)
        with Locations((-66.324847601, 82.5)):
            Rectangle(BOSS_EXTRUDE1_OUTLINE_W_2, BOSS_EXTRUDE1_OUTLINE_H_2, mode=Mode.SUBTRACT)
        with Locations((-58.824847601, 82.5)):
            Circle(BOSS_EXTRUDE1_OUTLINE_R, mode=Mode.SUBTRACT)
        with Locations((-51.324847601, 82.5)):
            Rectangle(BOSS_EXTRUDE1_OUTLINE_W_2, BOSS_EXTRUDE1_OUTLINE_H_2, mode=Mode.SUBTRACT)
        with Locations((83.676044481, 82.5)):
            Rectangle(BOSS_EXTRUDE1_OUTLINE_W_2, BOSS_EXTRUDE1_OUTLINE_H_2, mode=Mode.SUBTRACT)
        with Locations((91.176044481, 82.5)):
            Circle(BOSS_EXTRUDE1_OUTLINE_R, mode=Mode.SUBTRACT)
        with Locations((116.17604449, 57.5)):
            Rectangle(BOSS_EXTRUDE1_OUTLINE_W_2, BOSS_EXTRUDE1_OUTLINE_H_2, mode=Mode.SUBTRACT)
        with Locations((116.17604449, 65)):
            Circle(BOSS_EXTRUDE1_OUTLINE_R, mode=Mode.SUBTRACT)
        with Locations((131.17604449, 57.5)):
            Rectangle(BOSS_EXTRUDE1_OUTLINE_W_2, BOSS_EXTRUDE1_OUTLINE_H_2, mode=Mode.SUBTRACT)
        with Locations((131.17604449, 65)):
            Circle(BOSS_EXTRUDE1_OUTLINE_R, mode=Mode.SUBTRACT)
        with Locations((146.17604449, 57.5)):
            Rectangle(BOSS_EXTRUDE1_OUTLINE_W_2, BOSS_EXTRUDE1_OUTLINE_H_2, mode=Mode.SUBTRACT)
        with Locations((146.17604449, 65)):
            Circle(BOSS_EXTRUDE1_OUTLINE_R, mode=Mode.SUBTRACT)
        with Locations((116.17604449, 72.5)):
            Rectangle(BOSS_EXTRUDE1_OUTLINE_W_2, BOSS_EXTRUDE1_OUTLINE_H_2, mode=Mode.SUBTRACT)
        with Locations((98.67604449, 82.5)):
            Rectangle(BOSS_EXTRUDE1_OUTLINE_W_2, BOSS_EXTRUDE1_OUTLINE_H_2, mode=Mode.SUBTRACT)
        with Locations((106.17604449, 82.5)):
            Circle(BOSS_EXTRUDE1_OUTLINE_R, mode=Mode.SUBTRACT)
        with Locations((113.67604449, 82.5)):
            Rectangle(BOSS_EXTRUDE1_OUTLINE_W_2, BOSS_EXTRUDE1_OUTLINE_H_2, mode=Mode.SUBTRACT)
        with Locations((121.17604449, 82.5)):
            Circle(BOSS_EXTRUDE1_OUTLINE_R, mode=Mode.SUBTRACT)
        with Locations((131.17604449, 72.5)):
            Rectangle(BOSS_EXTRUDE1_OUTLINE_W_2, BOSS_EXTRUDE1_OUTLINE_H_2, mode=Mode.SUBTRACT)
        with Locations((146.17604449, 72.5)):
            Rectangle(BOSS_EXTRUDE1_OUTLINE_W_2, BOSS_EXTRUDE1_OUTLINE_H_2, mode=Mode.SUBTRACT)
        with Locations((128.67604449, 82.5)):
            Rectangle(BOSS_EXTRUDE1_OUTLINE_W_2, BOSS_EXTRUDE1_OUTLINE_H_2, mode=Mode.SUBTRACT)
    extrude(amount=BOSS_EXTRUDE1_DEPTH)

    # Fillet1
    fillet1_edges = [part.edges().sort_by_distance(p)[0] for p in [
        (153.67604449, -90, 2.5),
        (-91.324401555, -90, 2.5),
        (-91.324401555, 90, 2.5),
        (153.67604449, 90, 2.5),
    ]]
    fillet(fillet1_edges, radius=FILLET1_R)


solid = part.part
